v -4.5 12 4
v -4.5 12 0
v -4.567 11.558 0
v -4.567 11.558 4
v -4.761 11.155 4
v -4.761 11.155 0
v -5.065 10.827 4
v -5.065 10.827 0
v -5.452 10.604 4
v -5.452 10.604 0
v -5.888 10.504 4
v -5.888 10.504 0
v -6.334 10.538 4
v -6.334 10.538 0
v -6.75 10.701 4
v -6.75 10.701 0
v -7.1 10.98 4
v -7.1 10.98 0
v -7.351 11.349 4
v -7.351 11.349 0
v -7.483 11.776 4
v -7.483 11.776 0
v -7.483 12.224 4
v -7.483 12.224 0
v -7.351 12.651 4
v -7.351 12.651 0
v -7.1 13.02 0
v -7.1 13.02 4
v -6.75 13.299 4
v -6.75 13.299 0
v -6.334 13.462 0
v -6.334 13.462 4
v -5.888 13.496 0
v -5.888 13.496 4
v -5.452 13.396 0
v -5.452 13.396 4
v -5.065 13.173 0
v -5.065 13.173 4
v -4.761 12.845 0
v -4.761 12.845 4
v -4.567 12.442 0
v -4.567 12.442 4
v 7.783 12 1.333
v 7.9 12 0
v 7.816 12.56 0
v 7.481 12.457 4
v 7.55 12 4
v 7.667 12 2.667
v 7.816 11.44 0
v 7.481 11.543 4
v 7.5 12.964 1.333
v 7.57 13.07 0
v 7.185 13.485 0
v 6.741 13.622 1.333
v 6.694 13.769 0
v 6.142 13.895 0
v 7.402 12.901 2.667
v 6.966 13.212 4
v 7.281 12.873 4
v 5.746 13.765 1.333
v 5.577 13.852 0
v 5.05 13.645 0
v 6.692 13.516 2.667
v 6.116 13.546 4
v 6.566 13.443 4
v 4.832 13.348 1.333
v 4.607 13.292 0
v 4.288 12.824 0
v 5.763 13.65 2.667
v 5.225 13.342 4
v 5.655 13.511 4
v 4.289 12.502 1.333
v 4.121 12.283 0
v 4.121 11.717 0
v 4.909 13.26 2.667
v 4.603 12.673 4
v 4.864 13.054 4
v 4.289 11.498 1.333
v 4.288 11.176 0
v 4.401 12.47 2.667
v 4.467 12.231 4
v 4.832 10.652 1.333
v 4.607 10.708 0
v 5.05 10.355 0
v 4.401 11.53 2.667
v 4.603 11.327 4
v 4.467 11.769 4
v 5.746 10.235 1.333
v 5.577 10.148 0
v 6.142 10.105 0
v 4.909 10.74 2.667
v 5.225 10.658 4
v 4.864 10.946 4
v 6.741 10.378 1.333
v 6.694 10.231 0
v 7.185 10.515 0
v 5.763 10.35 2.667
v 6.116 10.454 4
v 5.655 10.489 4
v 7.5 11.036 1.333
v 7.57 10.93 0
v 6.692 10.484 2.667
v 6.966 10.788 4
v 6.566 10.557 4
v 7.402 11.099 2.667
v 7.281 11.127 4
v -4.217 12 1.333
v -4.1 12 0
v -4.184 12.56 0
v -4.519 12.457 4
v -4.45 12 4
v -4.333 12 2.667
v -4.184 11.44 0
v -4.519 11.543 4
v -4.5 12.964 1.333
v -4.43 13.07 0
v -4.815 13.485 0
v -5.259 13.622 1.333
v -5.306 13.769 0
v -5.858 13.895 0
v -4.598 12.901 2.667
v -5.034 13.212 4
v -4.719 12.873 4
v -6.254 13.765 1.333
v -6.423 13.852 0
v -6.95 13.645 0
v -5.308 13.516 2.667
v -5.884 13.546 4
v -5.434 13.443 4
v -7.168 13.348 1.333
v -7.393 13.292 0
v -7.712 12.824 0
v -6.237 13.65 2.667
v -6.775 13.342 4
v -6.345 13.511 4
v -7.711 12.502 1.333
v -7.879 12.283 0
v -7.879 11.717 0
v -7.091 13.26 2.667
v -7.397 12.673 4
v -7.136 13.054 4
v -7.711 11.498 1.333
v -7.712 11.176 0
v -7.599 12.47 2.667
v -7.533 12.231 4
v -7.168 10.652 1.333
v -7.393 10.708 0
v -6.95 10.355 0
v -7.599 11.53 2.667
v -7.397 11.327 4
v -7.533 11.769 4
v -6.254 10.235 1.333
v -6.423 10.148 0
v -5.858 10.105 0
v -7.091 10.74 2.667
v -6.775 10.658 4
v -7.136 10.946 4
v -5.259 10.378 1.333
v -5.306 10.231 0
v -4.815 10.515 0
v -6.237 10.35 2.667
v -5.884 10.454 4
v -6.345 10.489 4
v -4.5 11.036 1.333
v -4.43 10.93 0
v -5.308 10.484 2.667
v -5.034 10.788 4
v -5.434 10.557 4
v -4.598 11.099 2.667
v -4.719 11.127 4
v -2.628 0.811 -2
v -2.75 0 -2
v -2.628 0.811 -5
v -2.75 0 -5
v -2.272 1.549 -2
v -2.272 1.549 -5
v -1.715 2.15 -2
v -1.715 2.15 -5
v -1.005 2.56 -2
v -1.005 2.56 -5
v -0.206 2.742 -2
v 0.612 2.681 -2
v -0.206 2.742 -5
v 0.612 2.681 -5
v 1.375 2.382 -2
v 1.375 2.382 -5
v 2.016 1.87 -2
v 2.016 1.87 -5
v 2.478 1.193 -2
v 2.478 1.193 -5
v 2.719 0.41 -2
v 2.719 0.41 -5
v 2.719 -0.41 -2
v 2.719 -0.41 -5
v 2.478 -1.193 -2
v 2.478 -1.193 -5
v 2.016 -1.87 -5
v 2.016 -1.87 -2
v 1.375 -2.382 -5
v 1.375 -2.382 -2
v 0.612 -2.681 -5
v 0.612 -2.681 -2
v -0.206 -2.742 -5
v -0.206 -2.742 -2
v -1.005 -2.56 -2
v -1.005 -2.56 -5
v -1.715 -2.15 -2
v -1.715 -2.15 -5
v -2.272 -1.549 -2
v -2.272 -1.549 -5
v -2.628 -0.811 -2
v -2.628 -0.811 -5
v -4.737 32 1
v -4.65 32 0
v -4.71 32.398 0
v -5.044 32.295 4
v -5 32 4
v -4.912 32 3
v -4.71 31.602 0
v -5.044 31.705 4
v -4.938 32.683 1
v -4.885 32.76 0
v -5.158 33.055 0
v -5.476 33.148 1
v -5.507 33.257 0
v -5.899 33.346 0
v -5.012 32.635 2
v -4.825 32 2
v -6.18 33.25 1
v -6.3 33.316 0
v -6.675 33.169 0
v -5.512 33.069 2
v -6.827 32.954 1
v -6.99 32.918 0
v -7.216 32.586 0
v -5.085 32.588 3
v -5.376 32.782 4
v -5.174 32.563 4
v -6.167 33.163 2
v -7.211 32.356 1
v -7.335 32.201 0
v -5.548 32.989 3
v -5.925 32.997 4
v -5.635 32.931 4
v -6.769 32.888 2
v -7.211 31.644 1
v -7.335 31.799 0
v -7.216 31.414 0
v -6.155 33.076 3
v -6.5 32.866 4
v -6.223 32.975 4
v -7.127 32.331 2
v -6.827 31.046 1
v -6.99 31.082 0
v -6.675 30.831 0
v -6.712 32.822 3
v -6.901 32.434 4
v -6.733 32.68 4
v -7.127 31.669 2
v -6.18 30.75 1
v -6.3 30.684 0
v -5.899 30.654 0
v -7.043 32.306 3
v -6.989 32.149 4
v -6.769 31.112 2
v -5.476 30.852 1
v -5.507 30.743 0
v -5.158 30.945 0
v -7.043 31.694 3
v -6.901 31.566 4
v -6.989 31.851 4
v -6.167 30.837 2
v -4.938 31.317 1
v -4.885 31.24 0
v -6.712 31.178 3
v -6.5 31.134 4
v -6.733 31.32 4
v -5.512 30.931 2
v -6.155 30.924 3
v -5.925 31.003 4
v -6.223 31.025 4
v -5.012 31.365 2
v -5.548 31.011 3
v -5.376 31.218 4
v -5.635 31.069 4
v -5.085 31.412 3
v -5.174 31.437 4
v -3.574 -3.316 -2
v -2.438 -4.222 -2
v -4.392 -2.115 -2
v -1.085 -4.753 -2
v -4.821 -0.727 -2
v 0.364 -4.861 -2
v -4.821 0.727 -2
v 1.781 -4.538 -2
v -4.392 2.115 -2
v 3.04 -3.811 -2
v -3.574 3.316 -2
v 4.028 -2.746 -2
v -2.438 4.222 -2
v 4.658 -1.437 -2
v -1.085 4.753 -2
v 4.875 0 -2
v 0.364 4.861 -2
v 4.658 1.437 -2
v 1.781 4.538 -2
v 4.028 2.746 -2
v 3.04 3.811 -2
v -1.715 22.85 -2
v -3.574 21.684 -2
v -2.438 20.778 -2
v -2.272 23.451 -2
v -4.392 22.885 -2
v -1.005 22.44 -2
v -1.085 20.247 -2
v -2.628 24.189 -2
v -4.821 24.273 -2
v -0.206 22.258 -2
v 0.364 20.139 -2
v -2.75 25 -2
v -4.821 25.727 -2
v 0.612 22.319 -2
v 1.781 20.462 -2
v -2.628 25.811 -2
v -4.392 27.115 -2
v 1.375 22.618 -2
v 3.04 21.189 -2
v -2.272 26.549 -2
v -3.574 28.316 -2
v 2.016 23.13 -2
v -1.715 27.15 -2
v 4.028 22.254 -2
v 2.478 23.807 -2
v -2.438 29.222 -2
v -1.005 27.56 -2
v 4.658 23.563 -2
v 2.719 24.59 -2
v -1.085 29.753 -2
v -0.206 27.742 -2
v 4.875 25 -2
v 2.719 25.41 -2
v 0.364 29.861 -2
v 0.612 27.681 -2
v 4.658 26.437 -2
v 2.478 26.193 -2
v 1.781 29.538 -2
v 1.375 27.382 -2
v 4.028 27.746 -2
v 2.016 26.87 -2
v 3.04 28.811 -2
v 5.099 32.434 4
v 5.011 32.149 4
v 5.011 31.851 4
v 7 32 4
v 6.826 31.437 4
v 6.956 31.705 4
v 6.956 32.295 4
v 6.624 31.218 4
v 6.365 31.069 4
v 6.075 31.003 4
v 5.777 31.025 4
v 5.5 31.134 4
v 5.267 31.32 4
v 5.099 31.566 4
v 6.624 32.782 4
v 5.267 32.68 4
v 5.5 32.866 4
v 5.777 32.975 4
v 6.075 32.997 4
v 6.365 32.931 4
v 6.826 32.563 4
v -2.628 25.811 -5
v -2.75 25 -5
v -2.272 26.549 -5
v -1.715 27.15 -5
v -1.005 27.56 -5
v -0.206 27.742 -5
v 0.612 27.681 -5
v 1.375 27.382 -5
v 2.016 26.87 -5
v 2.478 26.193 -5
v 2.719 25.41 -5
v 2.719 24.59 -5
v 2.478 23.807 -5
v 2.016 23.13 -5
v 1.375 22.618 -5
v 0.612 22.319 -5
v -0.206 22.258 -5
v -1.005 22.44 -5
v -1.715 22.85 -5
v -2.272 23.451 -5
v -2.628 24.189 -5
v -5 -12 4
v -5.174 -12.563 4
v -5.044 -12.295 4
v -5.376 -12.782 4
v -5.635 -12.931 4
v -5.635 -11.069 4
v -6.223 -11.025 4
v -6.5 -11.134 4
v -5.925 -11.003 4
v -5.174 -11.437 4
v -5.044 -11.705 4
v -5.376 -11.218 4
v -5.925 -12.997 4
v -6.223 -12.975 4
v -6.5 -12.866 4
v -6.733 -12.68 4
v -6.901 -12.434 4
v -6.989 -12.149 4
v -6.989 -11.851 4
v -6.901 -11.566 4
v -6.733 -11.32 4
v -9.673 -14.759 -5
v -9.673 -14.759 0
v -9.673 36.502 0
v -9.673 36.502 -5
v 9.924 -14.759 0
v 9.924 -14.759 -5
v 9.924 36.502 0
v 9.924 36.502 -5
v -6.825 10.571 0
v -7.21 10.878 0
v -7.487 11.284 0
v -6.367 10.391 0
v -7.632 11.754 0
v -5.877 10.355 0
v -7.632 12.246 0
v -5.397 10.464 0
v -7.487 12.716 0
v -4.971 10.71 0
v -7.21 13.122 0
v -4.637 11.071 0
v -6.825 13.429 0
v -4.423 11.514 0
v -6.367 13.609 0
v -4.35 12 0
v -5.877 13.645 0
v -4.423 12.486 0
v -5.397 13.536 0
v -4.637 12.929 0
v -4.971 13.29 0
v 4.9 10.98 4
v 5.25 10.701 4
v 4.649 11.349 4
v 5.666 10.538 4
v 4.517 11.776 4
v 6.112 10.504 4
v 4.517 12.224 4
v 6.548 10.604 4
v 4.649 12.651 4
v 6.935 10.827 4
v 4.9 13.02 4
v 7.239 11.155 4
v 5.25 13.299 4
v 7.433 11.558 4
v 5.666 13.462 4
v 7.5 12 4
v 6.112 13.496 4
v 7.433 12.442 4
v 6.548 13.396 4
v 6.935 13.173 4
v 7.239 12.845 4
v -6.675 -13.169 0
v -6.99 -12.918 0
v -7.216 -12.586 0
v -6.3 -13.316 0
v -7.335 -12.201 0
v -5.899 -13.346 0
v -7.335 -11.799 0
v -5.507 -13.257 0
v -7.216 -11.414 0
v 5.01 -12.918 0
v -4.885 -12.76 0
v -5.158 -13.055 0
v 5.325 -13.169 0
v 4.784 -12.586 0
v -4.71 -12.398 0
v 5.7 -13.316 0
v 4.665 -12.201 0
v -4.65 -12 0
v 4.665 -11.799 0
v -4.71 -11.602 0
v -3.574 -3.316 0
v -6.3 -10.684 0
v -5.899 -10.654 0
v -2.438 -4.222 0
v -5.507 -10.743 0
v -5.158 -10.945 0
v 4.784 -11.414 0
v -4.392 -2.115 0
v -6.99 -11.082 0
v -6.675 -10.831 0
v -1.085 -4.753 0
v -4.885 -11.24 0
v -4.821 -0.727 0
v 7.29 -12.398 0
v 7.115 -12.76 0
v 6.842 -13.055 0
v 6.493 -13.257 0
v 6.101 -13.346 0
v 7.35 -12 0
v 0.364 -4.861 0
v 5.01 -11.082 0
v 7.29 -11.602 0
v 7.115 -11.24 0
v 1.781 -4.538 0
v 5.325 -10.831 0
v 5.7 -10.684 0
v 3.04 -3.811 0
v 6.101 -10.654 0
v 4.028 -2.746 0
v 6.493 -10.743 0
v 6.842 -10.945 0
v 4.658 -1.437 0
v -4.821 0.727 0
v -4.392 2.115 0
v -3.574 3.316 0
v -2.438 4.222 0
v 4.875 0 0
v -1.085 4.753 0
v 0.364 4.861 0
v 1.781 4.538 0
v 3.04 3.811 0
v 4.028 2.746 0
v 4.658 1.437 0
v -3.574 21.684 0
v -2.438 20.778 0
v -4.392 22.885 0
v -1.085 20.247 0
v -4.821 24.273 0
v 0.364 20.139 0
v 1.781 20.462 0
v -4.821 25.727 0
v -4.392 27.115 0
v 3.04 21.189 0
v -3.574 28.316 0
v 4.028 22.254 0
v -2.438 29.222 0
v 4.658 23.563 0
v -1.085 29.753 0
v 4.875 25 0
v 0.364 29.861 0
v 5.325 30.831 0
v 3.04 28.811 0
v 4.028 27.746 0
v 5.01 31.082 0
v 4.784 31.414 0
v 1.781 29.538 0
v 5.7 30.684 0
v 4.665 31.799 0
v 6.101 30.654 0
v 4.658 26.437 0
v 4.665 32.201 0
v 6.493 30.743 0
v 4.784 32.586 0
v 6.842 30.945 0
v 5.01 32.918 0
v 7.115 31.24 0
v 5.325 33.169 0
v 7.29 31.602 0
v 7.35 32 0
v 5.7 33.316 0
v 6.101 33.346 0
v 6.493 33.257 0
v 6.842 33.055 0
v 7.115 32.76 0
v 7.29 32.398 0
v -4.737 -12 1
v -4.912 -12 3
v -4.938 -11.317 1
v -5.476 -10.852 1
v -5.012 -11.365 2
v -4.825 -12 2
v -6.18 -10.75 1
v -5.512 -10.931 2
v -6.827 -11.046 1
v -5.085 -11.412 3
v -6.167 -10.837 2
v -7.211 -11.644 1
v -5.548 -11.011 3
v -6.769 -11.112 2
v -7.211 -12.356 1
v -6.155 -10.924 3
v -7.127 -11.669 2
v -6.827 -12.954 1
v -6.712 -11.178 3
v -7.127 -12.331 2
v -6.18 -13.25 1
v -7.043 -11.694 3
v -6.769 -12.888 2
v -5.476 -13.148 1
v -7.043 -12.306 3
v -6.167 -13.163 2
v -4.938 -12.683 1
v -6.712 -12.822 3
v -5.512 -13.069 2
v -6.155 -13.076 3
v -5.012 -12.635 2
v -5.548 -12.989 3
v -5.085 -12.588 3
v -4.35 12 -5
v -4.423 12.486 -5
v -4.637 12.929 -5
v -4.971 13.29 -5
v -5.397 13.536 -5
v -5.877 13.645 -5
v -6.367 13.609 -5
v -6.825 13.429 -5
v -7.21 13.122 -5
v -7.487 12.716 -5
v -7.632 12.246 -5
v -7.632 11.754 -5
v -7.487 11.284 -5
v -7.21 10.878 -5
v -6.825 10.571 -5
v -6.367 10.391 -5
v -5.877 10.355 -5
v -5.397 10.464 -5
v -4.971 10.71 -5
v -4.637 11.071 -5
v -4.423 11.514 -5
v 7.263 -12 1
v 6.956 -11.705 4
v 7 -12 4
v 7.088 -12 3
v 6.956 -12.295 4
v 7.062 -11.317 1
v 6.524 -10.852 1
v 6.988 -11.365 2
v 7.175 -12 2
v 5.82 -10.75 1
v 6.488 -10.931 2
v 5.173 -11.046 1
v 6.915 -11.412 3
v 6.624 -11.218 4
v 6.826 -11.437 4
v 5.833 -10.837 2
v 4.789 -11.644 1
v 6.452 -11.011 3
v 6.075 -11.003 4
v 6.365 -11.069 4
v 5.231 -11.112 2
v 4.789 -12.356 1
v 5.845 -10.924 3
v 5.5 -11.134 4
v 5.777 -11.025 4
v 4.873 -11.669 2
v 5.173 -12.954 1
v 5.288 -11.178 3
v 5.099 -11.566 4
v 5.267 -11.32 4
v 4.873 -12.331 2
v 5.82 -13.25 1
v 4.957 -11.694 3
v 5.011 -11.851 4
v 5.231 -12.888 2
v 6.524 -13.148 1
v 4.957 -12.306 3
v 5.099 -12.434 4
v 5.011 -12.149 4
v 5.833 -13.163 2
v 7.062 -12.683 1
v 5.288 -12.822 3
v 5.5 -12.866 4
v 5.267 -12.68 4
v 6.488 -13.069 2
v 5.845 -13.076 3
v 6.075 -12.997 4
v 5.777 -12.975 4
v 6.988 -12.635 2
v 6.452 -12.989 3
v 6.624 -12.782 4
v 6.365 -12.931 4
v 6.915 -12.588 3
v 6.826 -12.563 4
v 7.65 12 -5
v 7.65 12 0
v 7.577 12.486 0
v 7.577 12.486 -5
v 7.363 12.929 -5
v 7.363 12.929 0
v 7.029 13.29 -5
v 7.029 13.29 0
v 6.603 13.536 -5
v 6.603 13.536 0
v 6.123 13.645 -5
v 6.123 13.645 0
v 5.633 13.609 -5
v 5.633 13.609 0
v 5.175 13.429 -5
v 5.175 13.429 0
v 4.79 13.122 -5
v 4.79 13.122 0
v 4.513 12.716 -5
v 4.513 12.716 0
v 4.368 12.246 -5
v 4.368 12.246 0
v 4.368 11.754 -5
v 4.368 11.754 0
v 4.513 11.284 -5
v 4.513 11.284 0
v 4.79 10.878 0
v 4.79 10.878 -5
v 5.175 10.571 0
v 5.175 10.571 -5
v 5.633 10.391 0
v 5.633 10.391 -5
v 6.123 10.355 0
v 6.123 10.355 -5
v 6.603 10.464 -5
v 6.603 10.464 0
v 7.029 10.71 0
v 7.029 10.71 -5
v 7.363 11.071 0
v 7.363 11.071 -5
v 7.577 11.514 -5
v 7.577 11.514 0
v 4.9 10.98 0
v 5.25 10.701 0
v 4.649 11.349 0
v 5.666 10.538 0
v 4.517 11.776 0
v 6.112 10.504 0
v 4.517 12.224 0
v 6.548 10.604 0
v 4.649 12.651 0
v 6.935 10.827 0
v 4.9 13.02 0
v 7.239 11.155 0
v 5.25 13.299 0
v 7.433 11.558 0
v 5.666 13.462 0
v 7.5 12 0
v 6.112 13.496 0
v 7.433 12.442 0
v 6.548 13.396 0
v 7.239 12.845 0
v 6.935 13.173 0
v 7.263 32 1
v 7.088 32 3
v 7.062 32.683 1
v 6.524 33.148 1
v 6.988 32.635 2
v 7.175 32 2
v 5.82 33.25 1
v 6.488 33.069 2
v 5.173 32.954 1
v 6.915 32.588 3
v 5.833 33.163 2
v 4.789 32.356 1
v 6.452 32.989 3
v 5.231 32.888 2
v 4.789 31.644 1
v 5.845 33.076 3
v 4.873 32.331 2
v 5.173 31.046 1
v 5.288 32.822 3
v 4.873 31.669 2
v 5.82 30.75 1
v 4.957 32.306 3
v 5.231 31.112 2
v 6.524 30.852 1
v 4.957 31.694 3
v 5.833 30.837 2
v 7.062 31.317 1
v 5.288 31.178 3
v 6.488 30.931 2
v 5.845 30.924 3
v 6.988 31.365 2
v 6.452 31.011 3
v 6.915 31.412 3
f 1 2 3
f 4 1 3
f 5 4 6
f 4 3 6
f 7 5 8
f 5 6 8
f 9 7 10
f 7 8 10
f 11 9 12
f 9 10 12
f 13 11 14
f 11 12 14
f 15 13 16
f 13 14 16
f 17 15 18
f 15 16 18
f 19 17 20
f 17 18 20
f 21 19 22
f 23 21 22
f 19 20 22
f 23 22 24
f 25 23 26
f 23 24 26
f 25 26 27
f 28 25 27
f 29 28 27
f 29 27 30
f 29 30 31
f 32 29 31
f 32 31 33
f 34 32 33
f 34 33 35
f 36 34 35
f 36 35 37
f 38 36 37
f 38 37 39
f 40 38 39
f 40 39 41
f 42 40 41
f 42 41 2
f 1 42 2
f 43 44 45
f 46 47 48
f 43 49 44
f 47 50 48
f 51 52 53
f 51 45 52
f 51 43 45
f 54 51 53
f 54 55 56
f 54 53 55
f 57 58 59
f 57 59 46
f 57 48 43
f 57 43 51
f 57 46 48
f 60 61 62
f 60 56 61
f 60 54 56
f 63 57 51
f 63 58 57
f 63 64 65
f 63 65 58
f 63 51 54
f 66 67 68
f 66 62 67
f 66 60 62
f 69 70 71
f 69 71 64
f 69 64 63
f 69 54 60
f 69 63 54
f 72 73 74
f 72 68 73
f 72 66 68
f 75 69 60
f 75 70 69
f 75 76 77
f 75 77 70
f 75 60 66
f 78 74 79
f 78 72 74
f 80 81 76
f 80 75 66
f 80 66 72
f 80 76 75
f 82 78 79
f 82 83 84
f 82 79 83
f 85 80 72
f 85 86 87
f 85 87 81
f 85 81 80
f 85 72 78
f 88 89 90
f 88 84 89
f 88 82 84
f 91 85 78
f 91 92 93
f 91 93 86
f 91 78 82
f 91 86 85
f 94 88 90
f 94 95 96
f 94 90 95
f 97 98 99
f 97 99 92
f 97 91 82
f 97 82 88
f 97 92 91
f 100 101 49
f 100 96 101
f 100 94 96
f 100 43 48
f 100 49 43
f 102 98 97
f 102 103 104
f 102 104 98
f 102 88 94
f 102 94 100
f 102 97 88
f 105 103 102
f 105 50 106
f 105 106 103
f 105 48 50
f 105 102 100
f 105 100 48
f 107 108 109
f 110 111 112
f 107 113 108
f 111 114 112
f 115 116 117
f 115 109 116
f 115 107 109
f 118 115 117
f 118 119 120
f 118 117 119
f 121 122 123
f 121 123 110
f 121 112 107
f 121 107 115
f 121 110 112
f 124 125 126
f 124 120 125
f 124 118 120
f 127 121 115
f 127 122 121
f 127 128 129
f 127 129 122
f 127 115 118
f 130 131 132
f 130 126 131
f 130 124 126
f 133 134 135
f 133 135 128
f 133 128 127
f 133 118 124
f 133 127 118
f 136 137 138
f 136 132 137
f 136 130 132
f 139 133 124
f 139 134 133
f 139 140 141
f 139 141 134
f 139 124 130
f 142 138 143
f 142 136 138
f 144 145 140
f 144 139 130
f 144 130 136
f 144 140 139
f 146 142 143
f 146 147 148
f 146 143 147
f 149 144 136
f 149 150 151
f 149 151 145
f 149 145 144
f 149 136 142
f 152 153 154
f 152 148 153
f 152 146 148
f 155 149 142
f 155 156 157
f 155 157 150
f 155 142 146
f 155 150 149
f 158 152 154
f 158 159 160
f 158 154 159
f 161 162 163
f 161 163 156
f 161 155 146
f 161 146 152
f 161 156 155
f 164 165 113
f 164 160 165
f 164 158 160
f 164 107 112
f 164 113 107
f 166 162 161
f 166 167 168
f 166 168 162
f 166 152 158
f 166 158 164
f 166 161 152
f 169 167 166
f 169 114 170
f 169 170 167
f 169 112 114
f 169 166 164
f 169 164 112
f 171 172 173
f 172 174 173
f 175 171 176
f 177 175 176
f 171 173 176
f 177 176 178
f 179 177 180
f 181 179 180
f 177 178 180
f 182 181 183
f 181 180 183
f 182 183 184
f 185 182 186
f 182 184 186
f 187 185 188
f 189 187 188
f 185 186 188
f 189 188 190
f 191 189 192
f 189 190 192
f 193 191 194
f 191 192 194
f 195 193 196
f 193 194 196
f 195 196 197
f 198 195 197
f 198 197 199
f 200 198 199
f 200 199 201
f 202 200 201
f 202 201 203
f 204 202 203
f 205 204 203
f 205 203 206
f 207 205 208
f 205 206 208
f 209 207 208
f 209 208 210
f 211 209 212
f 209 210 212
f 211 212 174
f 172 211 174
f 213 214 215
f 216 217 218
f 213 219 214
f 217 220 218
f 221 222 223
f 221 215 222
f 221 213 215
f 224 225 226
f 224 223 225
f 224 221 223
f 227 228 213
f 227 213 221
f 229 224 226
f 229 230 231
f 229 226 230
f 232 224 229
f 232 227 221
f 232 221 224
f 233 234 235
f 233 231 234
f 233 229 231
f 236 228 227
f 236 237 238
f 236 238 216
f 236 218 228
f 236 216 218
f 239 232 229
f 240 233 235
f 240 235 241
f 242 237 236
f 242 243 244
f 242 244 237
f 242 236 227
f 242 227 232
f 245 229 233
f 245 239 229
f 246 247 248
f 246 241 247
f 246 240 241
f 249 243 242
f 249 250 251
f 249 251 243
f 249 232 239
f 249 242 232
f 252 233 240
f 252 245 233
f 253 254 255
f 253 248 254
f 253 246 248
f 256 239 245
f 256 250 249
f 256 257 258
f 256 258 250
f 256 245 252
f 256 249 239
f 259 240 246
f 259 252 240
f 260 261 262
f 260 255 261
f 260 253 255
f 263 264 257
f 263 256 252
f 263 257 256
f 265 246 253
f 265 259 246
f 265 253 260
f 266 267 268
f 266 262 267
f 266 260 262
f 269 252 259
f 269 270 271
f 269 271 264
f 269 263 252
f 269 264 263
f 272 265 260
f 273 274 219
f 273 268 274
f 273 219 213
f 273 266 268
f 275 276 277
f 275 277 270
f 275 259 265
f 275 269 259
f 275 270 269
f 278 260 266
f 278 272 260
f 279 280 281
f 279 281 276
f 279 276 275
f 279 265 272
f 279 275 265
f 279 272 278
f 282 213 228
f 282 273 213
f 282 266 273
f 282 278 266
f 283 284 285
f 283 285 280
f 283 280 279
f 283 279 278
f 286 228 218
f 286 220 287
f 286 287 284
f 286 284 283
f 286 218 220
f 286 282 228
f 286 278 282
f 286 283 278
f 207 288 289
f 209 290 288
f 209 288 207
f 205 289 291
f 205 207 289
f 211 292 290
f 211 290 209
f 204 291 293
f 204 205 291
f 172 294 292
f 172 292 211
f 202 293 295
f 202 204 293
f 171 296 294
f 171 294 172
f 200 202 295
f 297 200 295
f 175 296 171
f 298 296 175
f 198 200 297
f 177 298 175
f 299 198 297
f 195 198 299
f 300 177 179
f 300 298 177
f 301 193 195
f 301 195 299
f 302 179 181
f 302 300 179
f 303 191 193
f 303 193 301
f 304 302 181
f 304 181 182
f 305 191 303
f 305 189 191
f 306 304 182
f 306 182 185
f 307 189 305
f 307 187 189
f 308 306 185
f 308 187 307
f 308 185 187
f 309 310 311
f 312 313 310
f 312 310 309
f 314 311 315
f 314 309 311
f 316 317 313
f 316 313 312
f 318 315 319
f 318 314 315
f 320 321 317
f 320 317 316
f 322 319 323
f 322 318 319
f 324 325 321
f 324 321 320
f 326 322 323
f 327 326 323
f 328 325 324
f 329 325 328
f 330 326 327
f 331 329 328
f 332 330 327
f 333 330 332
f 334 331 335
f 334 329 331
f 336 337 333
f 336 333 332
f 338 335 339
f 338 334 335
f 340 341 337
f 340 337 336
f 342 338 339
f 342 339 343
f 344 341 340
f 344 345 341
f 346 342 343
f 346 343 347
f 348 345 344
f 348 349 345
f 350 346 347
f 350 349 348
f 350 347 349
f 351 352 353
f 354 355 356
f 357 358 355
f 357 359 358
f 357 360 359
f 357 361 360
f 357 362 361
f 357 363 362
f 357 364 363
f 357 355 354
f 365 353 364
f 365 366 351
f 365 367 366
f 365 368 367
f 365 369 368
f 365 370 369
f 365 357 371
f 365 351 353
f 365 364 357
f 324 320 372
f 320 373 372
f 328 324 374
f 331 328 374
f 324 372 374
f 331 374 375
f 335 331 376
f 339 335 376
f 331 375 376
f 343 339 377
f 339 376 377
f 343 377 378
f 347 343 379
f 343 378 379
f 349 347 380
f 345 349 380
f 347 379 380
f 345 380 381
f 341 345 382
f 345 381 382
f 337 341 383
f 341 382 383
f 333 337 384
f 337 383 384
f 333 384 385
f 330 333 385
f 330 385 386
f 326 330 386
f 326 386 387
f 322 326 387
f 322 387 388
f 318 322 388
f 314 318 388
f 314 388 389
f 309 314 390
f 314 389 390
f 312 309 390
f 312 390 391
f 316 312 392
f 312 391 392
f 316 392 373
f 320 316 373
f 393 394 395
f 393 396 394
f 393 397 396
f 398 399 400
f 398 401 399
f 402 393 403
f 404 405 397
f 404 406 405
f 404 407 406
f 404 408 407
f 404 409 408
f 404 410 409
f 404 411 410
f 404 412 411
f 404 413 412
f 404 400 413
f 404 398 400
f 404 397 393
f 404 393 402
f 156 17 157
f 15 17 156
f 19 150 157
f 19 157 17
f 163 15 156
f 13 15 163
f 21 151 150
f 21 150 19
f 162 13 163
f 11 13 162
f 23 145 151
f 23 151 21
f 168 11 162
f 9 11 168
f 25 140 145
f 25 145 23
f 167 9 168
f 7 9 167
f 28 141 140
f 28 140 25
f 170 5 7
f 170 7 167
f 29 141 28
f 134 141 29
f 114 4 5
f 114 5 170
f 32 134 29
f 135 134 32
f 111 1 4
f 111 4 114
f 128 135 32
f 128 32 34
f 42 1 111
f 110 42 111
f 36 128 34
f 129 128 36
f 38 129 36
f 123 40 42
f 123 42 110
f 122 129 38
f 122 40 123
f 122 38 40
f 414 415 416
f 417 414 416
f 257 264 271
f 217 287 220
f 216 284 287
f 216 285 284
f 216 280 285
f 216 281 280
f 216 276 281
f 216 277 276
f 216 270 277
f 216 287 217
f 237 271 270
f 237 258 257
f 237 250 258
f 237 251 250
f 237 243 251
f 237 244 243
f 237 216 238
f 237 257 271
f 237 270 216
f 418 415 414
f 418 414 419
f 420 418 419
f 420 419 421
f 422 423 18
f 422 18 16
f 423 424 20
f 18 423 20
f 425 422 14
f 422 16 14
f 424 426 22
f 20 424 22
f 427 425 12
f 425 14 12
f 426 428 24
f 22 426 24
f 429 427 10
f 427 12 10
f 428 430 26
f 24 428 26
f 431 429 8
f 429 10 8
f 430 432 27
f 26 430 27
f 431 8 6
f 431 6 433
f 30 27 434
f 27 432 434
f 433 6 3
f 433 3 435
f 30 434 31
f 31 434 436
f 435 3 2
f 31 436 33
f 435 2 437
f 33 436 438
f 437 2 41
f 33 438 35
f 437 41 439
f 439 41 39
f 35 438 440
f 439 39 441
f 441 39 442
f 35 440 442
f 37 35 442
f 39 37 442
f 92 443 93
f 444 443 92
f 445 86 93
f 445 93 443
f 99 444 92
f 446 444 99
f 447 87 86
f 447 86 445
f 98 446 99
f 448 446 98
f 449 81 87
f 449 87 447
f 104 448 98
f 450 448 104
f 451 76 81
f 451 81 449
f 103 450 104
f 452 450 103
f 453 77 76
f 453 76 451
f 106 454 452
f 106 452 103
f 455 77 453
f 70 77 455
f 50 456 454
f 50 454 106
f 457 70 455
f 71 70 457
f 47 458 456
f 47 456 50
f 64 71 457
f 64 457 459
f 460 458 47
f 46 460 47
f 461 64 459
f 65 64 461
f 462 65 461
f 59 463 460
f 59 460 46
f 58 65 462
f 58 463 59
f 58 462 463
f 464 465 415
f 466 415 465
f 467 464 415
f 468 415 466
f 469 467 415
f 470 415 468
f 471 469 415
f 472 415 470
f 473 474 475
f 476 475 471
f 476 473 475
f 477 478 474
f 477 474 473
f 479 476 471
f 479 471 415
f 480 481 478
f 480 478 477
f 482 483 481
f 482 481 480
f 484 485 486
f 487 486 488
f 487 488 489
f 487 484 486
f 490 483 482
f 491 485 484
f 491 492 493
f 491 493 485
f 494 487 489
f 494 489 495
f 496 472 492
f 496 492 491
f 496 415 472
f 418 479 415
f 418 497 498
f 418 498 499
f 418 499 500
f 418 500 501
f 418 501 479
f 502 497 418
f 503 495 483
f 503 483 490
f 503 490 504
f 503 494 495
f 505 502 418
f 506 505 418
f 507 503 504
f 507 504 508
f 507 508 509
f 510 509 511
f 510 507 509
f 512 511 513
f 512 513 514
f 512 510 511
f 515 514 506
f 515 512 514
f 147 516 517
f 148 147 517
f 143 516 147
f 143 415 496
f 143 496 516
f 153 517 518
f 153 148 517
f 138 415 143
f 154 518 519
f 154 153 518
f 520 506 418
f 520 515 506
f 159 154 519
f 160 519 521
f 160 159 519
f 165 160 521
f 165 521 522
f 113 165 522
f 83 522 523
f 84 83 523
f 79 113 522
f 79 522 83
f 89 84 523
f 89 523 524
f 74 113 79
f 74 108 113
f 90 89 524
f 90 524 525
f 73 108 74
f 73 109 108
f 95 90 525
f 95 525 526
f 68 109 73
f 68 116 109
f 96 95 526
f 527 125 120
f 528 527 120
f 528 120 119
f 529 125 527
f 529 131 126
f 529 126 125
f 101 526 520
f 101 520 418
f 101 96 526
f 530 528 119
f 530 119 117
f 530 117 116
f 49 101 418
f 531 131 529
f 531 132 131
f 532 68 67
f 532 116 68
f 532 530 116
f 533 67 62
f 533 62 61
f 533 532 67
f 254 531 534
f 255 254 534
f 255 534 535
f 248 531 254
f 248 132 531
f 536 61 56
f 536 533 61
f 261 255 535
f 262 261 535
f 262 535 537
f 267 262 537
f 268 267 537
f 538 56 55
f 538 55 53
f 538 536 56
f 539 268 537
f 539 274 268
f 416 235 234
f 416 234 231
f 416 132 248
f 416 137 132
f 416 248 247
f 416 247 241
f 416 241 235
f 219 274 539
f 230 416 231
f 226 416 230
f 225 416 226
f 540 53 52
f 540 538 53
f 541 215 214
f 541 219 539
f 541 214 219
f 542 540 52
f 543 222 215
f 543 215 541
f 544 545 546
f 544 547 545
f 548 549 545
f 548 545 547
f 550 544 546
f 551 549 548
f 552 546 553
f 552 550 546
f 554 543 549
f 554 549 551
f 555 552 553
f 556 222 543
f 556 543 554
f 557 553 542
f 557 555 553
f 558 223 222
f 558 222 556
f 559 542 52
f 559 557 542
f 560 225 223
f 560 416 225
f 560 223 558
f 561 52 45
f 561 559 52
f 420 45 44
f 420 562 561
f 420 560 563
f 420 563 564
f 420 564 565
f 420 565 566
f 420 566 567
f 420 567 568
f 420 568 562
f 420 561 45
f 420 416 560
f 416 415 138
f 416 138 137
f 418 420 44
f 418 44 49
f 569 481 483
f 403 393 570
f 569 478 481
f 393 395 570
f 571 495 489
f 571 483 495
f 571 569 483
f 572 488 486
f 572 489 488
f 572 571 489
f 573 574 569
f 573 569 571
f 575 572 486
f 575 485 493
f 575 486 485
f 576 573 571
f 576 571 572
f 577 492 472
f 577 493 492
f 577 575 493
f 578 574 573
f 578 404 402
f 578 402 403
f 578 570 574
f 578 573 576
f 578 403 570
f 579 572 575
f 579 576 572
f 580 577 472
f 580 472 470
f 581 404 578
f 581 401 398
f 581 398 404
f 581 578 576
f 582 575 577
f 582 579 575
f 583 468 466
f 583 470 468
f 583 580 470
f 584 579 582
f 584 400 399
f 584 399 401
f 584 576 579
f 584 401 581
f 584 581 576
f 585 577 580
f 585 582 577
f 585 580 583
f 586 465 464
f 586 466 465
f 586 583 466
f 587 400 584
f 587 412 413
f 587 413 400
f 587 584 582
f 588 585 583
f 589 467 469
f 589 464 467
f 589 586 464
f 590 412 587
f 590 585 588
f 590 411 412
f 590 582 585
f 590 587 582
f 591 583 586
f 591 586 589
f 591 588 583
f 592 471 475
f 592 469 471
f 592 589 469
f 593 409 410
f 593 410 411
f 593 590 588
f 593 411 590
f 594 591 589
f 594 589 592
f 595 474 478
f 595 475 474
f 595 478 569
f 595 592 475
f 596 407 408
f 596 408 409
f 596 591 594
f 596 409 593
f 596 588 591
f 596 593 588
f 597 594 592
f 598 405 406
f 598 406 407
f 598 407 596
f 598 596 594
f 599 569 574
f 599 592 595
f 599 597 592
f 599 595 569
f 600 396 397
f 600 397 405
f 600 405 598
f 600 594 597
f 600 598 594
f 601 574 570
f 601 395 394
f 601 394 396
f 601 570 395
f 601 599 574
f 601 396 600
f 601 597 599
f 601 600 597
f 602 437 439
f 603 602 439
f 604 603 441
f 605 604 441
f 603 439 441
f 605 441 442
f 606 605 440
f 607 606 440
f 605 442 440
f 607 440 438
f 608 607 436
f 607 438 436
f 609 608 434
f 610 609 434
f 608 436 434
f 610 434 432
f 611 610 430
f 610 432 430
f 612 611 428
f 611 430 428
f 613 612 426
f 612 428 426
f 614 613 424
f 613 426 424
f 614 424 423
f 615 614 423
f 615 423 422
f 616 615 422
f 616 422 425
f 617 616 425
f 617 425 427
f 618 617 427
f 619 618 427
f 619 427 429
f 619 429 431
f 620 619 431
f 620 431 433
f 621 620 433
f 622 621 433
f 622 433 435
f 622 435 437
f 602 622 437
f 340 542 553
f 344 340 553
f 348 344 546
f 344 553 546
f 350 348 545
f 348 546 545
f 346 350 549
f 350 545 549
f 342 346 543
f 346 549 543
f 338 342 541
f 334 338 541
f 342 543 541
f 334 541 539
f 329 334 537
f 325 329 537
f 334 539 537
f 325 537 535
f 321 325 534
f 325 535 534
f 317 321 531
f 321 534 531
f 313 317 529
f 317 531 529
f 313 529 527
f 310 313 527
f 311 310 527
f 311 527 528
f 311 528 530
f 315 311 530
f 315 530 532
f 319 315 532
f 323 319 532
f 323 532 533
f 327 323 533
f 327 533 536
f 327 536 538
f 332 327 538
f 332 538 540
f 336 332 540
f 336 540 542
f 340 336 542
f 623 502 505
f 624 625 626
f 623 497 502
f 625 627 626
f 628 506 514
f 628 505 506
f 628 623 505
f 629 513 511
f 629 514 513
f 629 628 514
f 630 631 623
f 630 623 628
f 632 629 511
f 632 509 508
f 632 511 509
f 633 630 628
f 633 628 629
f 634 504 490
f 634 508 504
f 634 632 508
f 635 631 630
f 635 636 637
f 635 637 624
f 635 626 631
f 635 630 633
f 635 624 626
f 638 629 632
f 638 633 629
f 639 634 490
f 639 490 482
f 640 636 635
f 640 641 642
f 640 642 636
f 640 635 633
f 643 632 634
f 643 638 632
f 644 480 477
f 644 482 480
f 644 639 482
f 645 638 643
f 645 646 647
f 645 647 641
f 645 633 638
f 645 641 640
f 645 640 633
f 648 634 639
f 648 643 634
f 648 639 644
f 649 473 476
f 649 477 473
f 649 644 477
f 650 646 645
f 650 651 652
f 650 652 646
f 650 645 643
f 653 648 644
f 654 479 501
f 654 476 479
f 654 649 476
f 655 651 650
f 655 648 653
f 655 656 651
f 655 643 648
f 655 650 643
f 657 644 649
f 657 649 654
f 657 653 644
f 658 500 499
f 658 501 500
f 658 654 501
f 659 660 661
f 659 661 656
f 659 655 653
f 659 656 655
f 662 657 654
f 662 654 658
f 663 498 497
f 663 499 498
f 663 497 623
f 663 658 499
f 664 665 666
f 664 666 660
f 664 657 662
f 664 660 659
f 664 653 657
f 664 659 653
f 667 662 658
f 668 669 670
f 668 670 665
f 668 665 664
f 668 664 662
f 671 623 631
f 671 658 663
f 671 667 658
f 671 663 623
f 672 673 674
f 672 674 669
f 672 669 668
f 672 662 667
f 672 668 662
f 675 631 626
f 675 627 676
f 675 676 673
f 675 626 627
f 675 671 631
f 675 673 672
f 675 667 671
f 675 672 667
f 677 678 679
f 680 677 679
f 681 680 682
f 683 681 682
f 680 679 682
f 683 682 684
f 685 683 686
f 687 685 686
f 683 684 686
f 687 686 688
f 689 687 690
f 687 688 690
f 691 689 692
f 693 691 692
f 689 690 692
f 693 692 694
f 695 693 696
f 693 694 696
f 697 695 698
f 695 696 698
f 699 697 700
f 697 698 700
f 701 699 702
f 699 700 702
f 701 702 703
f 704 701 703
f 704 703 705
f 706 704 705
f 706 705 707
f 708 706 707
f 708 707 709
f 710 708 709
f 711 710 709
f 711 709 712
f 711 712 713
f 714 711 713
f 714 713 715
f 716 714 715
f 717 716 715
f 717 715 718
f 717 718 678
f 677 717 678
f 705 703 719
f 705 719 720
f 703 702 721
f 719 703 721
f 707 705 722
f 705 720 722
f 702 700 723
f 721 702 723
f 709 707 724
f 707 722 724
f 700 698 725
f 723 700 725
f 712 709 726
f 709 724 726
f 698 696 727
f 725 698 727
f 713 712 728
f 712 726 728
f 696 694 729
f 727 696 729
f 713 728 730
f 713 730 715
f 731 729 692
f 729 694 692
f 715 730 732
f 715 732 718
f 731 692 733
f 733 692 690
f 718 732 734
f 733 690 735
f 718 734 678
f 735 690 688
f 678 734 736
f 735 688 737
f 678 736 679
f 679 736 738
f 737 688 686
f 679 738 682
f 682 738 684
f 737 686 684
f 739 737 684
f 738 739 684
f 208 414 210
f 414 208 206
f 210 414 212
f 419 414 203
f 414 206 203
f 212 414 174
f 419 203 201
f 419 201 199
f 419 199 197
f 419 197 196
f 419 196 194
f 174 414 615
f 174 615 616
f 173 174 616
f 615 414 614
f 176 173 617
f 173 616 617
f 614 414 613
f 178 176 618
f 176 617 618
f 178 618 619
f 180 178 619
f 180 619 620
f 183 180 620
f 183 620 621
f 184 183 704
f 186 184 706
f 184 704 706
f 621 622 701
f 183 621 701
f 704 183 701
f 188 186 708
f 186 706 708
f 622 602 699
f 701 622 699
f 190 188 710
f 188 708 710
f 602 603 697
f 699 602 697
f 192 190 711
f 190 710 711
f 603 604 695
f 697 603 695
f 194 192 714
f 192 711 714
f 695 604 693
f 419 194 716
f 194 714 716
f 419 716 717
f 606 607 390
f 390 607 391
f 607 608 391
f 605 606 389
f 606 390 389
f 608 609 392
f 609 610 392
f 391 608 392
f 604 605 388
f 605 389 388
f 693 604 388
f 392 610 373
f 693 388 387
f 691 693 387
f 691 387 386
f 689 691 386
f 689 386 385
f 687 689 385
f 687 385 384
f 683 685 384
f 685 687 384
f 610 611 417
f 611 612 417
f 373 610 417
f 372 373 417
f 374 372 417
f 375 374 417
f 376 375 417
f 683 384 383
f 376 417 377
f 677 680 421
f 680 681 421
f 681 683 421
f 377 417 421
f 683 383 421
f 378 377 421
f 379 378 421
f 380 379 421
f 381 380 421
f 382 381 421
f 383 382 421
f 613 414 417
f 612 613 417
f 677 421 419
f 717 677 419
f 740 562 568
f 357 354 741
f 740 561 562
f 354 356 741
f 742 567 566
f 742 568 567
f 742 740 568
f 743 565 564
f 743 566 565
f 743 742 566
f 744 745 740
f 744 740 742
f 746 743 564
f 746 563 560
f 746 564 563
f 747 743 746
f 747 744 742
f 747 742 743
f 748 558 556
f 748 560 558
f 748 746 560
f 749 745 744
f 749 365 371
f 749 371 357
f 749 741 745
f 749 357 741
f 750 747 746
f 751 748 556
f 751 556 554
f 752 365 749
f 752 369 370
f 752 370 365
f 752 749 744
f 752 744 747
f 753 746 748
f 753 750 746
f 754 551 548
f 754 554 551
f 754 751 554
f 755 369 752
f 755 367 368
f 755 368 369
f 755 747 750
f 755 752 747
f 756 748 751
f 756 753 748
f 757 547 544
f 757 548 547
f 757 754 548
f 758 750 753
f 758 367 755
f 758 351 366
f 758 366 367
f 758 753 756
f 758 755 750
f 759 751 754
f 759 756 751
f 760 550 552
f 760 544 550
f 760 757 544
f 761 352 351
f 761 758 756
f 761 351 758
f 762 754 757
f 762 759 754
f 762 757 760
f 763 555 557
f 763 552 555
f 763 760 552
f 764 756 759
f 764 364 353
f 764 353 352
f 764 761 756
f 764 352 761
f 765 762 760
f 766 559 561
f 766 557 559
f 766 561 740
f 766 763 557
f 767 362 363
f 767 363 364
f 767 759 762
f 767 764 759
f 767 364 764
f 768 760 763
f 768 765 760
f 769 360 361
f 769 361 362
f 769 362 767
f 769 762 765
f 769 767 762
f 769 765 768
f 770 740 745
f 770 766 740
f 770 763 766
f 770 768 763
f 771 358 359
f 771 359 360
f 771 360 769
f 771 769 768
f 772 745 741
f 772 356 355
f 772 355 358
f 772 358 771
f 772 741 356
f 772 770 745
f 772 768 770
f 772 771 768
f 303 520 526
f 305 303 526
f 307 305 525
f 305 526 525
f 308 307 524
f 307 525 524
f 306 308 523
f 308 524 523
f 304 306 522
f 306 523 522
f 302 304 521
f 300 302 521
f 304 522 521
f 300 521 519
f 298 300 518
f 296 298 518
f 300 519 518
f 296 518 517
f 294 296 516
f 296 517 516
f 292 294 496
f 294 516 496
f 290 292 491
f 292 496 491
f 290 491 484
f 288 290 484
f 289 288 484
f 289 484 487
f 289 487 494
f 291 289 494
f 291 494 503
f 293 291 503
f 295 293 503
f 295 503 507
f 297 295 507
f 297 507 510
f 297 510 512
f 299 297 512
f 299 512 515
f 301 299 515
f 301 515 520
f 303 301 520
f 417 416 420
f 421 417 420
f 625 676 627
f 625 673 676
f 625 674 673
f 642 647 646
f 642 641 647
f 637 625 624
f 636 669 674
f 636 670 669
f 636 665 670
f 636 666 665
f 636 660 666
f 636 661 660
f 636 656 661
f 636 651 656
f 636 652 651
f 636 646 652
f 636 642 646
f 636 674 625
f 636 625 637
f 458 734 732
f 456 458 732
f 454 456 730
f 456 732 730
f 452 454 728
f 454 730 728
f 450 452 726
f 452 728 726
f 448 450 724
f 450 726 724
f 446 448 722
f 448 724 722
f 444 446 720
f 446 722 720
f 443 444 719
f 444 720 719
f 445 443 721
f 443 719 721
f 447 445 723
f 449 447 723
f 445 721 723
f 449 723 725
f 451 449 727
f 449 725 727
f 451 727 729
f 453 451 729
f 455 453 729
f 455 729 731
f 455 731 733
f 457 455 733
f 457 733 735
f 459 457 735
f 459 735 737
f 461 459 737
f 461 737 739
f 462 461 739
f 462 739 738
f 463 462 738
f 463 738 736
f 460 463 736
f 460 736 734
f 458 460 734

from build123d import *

# Parameters (mm, degrees)
F1_W           = 19.5961911231
F1_H           = 51.2615609914
F2_DEPTH       = 5
F3_R           = 1.35
F3_R_2         = 1.9
F4_DEPTH       = 4
F4_TAPER       = 5
F5_D           = 3
F5_DEPTH       = 25
F5_TIP         = 0.9012909285
F6_D           = 3.3
F6_DEPTH       = 25
F6_TIP         = 0.9914200214
F8_D           = 5.5
F8_DEPTH       = 25
F8_CBORE_D     = 9.75
F8_CBORE_DEPTH = 2
F8_TIP         = 1.6523667023


# Not quite as in the source:
# - a feature names something its author has since deleted; it is built from what else it names


with BuildPart() as f2:
    # F1 (on Top) → F2 (new body)
    with BuildSketch(Plane.XY):
        with Locations((0.1254314557, 10.8716255054)):
            Rectangle(F1_W, F1_H)
    extrude(amount=-F2_DEPTH)

    # F3 (on face) → F4 (join)
    with BuildSketch(Plane.XY):
        with Locations((-6, 32)):
            Circle(F3_R)
        with Locations((6, 32)):
            Circle(F3_R)
        with Locations((6, 12)):
            Circle(F3_R_2)
        with Locations((-6, 12)):
            Circle(F3_R_2)
        with Locations((6, -12)):
            Circle(F3_R)
        with Locations((-6, -12)):
            Circle(F3_R)
    extrude(amount=F4_DEPTH, taper=F4_TAPER)

    # F5 (one way)
    with BuildSketch(Plane(origin=(0, 0, 0), x_dir=(1, 0, 0), z_dir=(0, 0, -1))):
        with Locations((-6, -12), (6, -12)):
            Circle(F5_D / 2)
    extrude(amount=-F5_DEPTH, mode=Mode.SUBTRACT)
    with Locations(Plane(origin=(0, 0, 0), x_dir=(1, 0, 0), z_dir=(0, 0, -1))):
        with Locations((-6, -12), (6, -12)):
            with Locations((0, 0, -(F5_DEPTH + F5_TIP / 2))):  # 118° drill point
                Cone(0, F5_D / 2, F5_TIP, mode=Mode.SUBTRACT)

    # F6 (one way)
    with BuildSketch(Plane.XY):
        with Locations((6, 12), (-6, 12)):
            Circle(F6_D / 2)
    extrude(amount=-F6_DEPTH, mode=Mode.SUBTRACT)
    with Locations(Plane.XY):
        with Locations((6, 12), (-6, 12)):
            with Locations((0, 0, -(F6_DEPTH + F6_TIP / 2))):  # 118° drill point
                Cone(0, F6_D / 2, F6_TIP, mode=Mode.SUBTRACT)

    # F8
    with Locations(Plane.XY):
        with Locations((0, 0), (0, 25)):
            CounterBoreHole(F8_D / 2, F8_CBORE_D / 2, F8_CBORE_DEPTH, depth=F8_DEPTH)
            with Locations((0, 0, -(F8_DEPTH + F8_TIP / 2))):  # 118° drill point
                Cone(0, F8_D / 2, F8_TIP, mode=Mode.SUBTRACT)


solid = f2.part
